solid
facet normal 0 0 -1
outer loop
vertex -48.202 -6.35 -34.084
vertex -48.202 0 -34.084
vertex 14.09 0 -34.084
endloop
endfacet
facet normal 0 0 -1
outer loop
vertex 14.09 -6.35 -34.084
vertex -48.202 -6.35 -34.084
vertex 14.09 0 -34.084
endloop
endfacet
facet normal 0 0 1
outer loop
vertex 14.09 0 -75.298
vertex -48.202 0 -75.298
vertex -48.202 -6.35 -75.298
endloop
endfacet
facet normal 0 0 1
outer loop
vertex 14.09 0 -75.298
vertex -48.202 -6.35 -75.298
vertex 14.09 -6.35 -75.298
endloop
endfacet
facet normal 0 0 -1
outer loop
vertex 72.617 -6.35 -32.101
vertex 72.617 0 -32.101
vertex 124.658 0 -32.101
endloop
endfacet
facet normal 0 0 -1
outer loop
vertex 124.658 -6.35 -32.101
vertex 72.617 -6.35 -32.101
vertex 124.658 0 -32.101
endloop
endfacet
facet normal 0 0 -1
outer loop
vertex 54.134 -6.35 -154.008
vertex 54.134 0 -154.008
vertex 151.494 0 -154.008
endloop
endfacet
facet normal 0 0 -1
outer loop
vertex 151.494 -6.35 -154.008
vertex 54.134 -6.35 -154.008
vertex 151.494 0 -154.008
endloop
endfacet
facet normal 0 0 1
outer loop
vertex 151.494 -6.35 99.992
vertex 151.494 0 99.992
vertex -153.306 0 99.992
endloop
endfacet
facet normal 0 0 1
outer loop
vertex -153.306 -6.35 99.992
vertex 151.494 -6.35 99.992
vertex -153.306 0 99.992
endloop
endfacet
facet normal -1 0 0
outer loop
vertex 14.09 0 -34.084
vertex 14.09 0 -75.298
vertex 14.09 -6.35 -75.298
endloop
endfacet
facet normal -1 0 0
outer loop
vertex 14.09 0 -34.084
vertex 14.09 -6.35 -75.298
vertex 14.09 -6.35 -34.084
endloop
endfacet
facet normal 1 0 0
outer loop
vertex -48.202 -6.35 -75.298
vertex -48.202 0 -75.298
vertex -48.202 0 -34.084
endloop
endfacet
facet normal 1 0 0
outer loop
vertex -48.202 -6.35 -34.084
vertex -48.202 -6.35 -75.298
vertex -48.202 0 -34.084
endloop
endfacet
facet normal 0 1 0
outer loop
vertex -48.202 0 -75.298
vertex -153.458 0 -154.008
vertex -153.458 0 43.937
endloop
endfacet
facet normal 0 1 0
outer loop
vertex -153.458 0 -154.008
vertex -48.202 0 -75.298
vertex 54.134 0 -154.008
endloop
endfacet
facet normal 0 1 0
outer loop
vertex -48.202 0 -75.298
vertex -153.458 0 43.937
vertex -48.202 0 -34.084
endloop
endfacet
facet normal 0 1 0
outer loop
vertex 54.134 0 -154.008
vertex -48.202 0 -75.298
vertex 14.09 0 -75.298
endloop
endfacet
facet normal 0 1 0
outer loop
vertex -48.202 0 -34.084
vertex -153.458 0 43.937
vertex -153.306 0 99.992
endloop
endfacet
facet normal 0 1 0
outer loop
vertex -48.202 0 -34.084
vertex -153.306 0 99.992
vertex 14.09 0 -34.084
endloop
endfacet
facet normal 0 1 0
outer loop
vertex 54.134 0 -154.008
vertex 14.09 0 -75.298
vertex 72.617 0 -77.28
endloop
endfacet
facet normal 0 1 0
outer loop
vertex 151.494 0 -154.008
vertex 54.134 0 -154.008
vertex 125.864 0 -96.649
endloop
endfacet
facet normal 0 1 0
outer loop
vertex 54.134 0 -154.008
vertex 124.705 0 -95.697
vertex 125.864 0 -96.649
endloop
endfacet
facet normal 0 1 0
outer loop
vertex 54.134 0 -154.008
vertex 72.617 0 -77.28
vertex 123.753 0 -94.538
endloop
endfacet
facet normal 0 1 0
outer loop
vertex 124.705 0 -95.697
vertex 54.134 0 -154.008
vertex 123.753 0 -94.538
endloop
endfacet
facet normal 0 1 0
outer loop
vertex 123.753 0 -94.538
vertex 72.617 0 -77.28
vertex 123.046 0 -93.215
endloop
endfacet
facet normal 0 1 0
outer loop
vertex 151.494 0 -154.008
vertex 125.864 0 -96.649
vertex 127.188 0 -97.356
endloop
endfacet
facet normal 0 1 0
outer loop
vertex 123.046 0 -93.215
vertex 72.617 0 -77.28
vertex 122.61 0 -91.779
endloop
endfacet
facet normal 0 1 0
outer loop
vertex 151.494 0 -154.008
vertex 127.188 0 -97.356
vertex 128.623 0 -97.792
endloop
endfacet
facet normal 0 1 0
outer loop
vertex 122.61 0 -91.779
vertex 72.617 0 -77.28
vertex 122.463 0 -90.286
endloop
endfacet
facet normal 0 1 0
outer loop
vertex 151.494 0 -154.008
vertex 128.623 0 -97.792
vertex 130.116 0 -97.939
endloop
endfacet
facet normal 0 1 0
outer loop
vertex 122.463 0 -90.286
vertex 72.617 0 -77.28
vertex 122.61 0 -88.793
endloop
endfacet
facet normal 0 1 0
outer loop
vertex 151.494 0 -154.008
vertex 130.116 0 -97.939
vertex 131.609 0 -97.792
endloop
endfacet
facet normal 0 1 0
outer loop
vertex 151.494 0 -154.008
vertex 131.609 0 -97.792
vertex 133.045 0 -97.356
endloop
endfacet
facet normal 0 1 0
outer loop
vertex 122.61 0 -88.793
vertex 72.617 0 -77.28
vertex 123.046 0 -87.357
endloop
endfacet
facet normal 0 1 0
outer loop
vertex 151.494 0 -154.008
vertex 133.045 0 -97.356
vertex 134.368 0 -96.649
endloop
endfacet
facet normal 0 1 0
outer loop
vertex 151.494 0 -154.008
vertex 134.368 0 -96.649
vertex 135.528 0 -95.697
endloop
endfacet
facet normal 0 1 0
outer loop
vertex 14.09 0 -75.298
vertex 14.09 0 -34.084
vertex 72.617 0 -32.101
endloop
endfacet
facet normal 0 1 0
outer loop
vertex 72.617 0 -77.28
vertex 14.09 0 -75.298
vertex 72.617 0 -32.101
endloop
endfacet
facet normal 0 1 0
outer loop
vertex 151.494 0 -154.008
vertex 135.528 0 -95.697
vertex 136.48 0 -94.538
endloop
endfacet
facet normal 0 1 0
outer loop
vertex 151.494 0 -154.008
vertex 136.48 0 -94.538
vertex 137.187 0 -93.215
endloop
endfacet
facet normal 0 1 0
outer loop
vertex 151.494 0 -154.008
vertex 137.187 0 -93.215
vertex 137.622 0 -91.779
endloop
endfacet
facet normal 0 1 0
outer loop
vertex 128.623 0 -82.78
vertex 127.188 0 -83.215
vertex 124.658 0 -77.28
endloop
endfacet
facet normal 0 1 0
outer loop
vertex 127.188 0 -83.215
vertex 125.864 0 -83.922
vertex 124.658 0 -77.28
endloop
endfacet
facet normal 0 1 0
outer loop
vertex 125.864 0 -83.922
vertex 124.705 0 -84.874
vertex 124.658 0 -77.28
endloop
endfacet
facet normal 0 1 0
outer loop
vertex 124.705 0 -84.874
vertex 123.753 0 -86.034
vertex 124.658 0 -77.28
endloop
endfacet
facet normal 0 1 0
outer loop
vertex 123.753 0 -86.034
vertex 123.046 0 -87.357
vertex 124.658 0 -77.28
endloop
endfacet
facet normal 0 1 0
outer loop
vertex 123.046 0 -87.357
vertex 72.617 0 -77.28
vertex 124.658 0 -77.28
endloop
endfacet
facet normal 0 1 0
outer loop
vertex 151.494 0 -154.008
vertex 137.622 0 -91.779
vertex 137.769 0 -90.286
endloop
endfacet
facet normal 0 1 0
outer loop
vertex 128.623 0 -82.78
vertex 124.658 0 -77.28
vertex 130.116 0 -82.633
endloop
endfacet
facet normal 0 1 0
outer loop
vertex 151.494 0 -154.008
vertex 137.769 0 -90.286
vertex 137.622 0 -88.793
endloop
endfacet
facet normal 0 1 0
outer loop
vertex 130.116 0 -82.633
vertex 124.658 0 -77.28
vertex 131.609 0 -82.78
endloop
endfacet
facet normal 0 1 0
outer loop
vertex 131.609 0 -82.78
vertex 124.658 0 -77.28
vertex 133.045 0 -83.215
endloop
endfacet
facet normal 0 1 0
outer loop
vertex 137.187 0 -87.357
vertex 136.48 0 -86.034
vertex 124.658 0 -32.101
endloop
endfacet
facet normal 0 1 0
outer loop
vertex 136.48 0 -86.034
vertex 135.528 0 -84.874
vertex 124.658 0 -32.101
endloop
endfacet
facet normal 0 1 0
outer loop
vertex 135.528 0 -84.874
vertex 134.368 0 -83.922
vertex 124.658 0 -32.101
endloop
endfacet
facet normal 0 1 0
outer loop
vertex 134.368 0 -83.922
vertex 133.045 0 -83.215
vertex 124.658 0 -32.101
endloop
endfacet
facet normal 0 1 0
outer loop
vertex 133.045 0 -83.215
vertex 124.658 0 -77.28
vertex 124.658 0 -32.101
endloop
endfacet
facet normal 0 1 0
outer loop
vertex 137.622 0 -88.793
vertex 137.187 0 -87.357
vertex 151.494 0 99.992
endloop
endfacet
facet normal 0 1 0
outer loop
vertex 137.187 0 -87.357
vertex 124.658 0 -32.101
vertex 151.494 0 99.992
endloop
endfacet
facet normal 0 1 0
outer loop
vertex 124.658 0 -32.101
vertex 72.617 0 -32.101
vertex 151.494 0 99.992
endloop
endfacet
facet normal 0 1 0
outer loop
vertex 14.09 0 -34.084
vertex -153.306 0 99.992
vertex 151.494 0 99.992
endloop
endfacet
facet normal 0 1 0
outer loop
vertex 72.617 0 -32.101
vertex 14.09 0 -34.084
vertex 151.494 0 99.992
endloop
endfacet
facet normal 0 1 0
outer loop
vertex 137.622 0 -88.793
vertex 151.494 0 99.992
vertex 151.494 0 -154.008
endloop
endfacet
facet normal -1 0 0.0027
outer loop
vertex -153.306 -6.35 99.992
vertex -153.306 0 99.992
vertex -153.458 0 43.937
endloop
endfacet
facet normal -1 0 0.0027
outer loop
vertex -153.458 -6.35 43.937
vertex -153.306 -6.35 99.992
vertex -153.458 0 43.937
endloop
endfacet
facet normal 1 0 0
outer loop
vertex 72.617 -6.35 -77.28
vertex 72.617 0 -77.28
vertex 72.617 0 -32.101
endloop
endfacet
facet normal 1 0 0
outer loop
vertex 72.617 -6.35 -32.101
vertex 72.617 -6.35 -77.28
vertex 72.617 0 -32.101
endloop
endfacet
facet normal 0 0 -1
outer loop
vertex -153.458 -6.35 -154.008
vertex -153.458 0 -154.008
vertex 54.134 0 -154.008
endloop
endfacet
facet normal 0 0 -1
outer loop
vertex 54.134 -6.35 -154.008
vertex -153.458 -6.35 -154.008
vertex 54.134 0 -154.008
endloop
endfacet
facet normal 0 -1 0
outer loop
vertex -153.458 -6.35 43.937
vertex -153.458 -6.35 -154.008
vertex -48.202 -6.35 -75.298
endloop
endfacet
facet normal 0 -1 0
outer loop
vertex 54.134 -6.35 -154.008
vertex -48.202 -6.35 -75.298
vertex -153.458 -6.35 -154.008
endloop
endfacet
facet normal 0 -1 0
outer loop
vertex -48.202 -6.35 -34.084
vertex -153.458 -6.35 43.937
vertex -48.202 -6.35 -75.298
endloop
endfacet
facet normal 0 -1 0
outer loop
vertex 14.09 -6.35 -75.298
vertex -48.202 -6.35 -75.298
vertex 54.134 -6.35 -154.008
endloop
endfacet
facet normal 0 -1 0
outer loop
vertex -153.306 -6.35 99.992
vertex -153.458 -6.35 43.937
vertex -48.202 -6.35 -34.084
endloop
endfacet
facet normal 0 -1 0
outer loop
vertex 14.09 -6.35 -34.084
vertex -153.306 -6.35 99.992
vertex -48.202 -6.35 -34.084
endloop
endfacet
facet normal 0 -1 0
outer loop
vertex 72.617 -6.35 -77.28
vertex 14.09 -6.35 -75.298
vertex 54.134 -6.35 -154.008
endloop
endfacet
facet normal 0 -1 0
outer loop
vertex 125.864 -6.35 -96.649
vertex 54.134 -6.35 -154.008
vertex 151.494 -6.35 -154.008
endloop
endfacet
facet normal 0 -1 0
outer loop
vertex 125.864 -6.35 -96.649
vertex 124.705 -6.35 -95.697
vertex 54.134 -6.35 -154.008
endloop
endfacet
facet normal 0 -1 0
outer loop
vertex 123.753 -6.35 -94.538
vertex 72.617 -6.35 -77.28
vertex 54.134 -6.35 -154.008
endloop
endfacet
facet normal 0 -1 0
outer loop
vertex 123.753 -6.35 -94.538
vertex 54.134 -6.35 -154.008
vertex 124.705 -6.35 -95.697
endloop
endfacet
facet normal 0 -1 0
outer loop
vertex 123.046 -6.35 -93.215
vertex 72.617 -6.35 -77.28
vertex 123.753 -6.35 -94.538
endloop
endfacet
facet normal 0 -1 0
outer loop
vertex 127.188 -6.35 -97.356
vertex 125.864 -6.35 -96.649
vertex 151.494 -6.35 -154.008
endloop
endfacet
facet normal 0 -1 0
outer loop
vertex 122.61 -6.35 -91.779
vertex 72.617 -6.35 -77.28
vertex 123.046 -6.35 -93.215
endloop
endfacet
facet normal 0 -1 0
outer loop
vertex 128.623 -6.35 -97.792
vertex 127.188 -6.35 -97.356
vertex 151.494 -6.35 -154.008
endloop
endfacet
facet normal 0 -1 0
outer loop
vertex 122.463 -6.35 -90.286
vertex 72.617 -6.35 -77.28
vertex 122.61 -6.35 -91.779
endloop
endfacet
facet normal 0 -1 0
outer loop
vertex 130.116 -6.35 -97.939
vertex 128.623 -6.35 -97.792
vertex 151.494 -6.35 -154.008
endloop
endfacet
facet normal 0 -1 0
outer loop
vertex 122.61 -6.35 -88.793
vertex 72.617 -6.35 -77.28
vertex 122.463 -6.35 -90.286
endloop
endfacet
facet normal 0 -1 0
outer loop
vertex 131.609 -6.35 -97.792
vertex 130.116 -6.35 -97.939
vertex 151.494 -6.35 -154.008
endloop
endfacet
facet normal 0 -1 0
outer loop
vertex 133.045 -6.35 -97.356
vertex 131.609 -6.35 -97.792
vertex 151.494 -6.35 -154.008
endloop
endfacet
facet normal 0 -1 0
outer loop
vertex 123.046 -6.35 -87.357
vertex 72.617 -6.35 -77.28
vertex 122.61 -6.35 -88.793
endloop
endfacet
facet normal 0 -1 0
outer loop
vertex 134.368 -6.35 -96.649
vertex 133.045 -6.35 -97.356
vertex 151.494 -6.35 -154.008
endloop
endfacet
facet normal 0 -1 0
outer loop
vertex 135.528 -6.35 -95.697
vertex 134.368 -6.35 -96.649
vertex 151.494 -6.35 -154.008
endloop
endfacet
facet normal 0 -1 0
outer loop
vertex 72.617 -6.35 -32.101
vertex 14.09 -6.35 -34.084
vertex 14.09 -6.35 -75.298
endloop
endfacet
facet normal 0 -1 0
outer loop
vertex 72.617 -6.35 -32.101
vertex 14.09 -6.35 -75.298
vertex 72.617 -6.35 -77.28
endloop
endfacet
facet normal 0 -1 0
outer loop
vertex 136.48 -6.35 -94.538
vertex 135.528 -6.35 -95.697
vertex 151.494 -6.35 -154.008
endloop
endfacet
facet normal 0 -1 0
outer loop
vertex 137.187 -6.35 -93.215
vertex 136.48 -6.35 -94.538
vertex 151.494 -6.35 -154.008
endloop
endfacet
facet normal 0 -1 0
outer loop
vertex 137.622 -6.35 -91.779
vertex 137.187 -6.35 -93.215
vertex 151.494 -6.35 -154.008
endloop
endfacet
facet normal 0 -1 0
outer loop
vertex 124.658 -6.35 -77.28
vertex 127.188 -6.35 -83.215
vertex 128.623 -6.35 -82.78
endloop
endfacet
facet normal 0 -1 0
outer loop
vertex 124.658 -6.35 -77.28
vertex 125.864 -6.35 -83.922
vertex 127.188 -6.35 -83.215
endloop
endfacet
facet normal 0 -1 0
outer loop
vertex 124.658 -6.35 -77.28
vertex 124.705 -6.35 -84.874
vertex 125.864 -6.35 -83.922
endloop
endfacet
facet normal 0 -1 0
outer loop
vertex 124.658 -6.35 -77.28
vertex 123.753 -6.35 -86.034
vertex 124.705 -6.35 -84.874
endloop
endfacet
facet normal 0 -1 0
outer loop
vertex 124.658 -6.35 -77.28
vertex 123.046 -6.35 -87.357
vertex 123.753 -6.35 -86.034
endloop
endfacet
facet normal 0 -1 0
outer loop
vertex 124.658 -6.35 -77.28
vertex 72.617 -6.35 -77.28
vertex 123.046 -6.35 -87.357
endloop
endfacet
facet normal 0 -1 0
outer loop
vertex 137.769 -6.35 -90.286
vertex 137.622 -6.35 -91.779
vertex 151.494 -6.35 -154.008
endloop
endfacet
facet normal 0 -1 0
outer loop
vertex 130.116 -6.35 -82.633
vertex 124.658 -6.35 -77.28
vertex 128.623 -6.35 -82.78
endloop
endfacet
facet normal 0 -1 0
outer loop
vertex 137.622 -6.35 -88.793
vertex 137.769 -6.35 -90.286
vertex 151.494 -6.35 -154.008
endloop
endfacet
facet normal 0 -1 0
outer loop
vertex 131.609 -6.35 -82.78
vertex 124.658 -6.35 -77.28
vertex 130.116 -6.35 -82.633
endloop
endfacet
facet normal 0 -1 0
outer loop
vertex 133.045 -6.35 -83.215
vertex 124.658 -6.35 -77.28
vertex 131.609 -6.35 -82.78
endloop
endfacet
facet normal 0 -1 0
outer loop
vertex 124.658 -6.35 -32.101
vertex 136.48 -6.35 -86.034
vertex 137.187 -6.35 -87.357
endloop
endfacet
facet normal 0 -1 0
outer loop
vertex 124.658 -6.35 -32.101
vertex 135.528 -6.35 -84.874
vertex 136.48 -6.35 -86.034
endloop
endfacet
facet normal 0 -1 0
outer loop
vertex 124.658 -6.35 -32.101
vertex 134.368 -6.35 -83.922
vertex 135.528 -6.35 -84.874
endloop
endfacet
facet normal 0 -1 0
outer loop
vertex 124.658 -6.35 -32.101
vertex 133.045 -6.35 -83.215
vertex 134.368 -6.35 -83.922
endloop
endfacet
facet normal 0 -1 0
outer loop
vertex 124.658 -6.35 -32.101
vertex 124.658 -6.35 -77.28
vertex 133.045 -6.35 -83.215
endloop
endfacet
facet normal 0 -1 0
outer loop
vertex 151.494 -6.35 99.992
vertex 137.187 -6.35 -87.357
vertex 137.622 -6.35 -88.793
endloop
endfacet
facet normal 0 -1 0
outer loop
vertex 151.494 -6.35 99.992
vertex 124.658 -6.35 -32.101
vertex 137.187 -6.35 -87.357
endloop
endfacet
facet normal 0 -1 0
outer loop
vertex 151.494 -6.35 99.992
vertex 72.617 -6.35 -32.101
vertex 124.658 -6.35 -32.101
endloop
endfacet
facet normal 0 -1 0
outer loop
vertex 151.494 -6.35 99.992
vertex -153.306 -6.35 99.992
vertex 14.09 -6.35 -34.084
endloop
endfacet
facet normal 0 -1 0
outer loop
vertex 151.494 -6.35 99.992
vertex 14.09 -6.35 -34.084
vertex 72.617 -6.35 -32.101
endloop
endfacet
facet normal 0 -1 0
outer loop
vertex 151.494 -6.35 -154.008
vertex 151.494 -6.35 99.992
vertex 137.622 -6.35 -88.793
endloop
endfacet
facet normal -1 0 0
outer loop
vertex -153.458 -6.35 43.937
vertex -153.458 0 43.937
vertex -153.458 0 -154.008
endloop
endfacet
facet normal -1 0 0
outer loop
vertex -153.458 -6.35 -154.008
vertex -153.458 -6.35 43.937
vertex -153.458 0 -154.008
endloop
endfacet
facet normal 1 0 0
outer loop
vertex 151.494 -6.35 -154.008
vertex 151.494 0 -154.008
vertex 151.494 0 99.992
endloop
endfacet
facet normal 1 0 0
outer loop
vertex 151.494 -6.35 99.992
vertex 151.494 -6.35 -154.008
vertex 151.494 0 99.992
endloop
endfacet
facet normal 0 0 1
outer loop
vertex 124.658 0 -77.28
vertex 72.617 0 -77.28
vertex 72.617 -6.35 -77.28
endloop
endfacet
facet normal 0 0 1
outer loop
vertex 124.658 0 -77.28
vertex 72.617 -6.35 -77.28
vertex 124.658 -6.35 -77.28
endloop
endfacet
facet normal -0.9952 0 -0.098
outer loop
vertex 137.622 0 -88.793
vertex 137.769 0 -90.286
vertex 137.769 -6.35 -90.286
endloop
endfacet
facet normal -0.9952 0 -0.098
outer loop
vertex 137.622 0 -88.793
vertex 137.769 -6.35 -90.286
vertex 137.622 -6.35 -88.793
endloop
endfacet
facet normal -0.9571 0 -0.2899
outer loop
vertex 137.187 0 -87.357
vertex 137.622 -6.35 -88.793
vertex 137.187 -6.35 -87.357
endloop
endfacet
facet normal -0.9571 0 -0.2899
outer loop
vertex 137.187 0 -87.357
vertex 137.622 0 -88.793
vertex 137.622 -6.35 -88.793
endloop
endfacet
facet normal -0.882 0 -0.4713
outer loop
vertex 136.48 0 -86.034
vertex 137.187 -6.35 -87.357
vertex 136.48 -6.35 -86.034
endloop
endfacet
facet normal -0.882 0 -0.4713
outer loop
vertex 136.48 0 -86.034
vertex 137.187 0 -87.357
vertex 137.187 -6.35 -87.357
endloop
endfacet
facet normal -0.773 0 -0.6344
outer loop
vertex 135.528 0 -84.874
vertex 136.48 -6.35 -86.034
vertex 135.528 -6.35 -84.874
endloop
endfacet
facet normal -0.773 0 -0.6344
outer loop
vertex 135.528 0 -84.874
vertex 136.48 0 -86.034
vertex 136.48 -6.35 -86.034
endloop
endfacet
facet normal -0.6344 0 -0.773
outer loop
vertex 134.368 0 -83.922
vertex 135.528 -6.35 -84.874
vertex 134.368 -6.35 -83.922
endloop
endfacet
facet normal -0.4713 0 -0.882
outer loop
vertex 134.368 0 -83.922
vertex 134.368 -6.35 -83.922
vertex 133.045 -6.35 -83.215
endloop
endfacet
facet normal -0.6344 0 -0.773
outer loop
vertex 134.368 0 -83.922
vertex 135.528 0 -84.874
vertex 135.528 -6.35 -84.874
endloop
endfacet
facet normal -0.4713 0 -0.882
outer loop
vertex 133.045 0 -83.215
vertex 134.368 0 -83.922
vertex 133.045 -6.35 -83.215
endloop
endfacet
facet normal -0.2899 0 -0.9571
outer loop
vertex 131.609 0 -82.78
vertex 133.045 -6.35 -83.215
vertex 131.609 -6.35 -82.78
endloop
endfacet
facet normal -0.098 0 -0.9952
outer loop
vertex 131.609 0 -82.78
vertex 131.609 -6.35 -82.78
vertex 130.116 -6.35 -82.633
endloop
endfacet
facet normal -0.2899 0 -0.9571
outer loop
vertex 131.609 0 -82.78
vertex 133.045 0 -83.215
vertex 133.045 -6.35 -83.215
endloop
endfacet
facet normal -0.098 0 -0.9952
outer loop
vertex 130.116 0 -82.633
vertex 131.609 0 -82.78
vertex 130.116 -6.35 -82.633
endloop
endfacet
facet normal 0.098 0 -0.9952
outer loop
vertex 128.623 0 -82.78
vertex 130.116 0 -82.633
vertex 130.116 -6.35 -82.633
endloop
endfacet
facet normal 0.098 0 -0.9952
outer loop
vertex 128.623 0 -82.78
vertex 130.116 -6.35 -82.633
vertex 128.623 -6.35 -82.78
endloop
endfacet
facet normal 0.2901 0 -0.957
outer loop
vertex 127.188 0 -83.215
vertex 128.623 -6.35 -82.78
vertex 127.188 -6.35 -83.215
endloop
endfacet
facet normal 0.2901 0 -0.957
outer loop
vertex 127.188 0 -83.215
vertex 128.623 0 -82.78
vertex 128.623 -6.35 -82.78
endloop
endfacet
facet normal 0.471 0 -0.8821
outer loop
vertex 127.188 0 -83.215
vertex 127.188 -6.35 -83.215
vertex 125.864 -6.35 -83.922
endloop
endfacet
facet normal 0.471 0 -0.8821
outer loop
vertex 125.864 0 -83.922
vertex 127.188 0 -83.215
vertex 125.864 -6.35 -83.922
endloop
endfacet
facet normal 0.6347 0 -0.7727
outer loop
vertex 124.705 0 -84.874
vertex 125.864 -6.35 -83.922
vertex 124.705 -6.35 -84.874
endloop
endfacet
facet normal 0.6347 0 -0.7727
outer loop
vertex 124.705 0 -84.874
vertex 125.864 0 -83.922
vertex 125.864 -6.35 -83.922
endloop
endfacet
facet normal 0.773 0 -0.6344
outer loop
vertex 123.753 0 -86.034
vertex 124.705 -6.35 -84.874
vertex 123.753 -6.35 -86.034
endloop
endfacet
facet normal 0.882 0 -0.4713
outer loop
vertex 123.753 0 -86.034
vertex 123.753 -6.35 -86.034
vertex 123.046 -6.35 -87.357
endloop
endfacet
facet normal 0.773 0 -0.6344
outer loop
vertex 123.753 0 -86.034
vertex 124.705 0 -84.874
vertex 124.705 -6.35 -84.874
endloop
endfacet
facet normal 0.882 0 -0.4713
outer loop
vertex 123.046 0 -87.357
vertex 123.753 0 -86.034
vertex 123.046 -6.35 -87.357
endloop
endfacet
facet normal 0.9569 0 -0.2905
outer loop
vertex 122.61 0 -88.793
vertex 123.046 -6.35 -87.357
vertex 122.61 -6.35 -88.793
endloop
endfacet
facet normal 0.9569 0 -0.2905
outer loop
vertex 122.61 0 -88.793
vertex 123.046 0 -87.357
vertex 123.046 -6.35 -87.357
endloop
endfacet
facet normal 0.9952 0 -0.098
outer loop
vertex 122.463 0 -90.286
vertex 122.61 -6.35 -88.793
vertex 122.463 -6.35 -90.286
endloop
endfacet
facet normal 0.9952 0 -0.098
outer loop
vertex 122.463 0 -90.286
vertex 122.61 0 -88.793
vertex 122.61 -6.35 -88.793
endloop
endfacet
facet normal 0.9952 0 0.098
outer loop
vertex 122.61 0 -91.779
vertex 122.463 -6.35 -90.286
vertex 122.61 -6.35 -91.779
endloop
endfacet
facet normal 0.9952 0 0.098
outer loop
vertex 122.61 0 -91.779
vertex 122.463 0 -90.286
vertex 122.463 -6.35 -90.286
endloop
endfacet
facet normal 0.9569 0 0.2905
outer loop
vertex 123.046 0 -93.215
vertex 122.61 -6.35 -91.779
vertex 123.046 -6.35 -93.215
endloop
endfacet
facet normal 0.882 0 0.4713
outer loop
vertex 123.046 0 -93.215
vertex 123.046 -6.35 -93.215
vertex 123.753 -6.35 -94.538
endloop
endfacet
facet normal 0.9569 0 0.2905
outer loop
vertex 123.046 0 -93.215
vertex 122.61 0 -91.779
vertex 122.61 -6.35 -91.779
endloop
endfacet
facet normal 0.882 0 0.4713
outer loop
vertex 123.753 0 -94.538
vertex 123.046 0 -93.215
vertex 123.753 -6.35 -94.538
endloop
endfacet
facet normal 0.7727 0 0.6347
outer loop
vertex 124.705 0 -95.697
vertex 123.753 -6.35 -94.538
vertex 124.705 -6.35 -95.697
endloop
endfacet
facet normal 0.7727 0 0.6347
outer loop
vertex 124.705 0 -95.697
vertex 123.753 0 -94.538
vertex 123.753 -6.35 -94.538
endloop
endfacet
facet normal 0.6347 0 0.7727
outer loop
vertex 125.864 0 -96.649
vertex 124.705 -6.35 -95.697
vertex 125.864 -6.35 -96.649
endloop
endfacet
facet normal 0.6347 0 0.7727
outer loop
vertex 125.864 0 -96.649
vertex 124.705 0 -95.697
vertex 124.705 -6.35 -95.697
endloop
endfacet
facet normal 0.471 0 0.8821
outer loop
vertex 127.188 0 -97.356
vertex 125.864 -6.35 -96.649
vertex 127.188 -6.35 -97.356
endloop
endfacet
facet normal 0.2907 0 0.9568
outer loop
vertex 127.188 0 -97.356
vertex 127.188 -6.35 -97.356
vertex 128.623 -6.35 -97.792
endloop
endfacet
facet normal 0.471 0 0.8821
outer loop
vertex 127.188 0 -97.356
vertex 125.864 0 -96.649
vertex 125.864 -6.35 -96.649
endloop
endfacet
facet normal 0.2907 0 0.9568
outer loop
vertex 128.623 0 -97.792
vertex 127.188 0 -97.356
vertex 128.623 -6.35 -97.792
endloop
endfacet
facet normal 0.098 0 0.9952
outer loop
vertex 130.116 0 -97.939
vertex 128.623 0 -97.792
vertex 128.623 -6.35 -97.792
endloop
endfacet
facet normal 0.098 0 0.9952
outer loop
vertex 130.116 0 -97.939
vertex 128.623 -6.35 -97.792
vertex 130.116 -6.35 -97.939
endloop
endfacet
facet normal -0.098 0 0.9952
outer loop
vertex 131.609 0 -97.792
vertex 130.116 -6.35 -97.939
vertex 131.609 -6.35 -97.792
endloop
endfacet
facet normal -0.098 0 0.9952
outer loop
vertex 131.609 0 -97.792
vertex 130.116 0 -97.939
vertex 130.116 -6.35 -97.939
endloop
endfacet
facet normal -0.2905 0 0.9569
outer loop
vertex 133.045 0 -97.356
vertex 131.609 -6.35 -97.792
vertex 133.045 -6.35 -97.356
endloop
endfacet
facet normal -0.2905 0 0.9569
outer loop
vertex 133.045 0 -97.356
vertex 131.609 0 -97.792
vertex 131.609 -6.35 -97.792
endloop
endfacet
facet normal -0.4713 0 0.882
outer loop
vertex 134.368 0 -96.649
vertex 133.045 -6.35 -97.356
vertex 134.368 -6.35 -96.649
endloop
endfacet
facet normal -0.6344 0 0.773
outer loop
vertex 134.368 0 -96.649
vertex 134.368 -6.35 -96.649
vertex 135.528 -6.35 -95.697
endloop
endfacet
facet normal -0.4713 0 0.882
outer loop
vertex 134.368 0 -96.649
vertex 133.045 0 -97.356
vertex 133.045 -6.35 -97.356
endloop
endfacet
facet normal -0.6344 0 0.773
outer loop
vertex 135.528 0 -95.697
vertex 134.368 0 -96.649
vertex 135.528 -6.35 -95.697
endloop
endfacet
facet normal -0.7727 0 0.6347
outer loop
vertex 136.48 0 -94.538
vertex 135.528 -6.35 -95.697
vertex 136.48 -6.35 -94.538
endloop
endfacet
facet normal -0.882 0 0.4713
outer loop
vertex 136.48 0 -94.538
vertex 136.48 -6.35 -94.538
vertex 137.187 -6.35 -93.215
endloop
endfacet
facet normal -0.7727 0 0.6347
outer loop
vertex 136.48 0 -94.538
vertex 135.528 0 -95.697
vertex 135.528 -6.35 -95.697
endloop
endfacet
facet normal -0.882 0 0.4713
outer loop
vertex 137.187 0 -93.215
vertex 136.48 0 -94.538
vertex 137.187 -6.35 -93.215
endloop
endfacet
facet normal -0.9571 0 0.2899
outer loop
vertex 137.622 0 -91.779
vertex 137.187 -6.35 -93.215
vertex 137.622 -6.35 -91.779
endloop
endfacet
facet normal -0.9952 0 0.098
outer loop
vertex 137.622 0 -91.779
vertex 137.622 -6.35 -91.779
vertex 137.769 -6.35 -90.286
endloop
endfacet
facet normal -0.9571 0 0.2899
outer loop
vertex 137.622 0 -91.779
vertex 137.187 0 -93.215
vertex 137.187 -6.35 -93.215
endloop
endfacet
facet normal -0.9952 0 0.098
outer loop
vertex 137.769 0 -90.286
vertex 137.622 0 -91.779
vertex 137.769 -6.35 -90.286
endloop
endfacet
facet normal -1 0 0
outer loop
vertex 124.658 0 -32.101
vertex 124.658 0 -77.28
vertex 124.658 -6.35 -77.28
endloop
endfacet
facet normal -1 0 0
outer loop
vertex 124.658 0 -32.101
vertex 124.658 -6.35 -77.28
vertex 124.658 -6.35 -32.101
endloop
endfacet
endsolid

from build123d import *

# Parameters (mm, degrees)
F0_W     = 62.291438
F0_H     = 41.213639
F0_W_2   = 97.35938
F0_H_2   = 154.007825
F0_R     = 7.65318
F0_W_3   = 52.04163
F0_H_3   = 45.17841
F1_DEPTH = 6.35


with BuildPart() as f1:
    # F0 (on Front) → F1 (new body)
    with BuildSketch(Plane.XZ):
        Polygon((151.493805, 99.992175), (-153.306195, 99.992175), (-153.458426, 43.937002), (-153.458426, -154.007825), (54.134425, -154.007825), (54.134425, 0), (151.493805, 0), align=None)
        with Locations((-17.055792, -54.690691)):
            Rectangle(F0_W, F0_H, mode=Mode.SUBTRACT)
        with Locations((102.814115, -77.003912)):
            Rectangle(F0_W_2, F0_H_2)
        with Locations((130.116299, -90.2858)):
            Circle(F0_R, mode=Mode.SUBTRACT)
        with Locations((98.637318, -54.690691)):
            Rectangle(F0_W_3, F0_H_3, mode=Mode.SUBTRACT)
    extrude(amount=F1_DEPTH)


solid = f1.part
